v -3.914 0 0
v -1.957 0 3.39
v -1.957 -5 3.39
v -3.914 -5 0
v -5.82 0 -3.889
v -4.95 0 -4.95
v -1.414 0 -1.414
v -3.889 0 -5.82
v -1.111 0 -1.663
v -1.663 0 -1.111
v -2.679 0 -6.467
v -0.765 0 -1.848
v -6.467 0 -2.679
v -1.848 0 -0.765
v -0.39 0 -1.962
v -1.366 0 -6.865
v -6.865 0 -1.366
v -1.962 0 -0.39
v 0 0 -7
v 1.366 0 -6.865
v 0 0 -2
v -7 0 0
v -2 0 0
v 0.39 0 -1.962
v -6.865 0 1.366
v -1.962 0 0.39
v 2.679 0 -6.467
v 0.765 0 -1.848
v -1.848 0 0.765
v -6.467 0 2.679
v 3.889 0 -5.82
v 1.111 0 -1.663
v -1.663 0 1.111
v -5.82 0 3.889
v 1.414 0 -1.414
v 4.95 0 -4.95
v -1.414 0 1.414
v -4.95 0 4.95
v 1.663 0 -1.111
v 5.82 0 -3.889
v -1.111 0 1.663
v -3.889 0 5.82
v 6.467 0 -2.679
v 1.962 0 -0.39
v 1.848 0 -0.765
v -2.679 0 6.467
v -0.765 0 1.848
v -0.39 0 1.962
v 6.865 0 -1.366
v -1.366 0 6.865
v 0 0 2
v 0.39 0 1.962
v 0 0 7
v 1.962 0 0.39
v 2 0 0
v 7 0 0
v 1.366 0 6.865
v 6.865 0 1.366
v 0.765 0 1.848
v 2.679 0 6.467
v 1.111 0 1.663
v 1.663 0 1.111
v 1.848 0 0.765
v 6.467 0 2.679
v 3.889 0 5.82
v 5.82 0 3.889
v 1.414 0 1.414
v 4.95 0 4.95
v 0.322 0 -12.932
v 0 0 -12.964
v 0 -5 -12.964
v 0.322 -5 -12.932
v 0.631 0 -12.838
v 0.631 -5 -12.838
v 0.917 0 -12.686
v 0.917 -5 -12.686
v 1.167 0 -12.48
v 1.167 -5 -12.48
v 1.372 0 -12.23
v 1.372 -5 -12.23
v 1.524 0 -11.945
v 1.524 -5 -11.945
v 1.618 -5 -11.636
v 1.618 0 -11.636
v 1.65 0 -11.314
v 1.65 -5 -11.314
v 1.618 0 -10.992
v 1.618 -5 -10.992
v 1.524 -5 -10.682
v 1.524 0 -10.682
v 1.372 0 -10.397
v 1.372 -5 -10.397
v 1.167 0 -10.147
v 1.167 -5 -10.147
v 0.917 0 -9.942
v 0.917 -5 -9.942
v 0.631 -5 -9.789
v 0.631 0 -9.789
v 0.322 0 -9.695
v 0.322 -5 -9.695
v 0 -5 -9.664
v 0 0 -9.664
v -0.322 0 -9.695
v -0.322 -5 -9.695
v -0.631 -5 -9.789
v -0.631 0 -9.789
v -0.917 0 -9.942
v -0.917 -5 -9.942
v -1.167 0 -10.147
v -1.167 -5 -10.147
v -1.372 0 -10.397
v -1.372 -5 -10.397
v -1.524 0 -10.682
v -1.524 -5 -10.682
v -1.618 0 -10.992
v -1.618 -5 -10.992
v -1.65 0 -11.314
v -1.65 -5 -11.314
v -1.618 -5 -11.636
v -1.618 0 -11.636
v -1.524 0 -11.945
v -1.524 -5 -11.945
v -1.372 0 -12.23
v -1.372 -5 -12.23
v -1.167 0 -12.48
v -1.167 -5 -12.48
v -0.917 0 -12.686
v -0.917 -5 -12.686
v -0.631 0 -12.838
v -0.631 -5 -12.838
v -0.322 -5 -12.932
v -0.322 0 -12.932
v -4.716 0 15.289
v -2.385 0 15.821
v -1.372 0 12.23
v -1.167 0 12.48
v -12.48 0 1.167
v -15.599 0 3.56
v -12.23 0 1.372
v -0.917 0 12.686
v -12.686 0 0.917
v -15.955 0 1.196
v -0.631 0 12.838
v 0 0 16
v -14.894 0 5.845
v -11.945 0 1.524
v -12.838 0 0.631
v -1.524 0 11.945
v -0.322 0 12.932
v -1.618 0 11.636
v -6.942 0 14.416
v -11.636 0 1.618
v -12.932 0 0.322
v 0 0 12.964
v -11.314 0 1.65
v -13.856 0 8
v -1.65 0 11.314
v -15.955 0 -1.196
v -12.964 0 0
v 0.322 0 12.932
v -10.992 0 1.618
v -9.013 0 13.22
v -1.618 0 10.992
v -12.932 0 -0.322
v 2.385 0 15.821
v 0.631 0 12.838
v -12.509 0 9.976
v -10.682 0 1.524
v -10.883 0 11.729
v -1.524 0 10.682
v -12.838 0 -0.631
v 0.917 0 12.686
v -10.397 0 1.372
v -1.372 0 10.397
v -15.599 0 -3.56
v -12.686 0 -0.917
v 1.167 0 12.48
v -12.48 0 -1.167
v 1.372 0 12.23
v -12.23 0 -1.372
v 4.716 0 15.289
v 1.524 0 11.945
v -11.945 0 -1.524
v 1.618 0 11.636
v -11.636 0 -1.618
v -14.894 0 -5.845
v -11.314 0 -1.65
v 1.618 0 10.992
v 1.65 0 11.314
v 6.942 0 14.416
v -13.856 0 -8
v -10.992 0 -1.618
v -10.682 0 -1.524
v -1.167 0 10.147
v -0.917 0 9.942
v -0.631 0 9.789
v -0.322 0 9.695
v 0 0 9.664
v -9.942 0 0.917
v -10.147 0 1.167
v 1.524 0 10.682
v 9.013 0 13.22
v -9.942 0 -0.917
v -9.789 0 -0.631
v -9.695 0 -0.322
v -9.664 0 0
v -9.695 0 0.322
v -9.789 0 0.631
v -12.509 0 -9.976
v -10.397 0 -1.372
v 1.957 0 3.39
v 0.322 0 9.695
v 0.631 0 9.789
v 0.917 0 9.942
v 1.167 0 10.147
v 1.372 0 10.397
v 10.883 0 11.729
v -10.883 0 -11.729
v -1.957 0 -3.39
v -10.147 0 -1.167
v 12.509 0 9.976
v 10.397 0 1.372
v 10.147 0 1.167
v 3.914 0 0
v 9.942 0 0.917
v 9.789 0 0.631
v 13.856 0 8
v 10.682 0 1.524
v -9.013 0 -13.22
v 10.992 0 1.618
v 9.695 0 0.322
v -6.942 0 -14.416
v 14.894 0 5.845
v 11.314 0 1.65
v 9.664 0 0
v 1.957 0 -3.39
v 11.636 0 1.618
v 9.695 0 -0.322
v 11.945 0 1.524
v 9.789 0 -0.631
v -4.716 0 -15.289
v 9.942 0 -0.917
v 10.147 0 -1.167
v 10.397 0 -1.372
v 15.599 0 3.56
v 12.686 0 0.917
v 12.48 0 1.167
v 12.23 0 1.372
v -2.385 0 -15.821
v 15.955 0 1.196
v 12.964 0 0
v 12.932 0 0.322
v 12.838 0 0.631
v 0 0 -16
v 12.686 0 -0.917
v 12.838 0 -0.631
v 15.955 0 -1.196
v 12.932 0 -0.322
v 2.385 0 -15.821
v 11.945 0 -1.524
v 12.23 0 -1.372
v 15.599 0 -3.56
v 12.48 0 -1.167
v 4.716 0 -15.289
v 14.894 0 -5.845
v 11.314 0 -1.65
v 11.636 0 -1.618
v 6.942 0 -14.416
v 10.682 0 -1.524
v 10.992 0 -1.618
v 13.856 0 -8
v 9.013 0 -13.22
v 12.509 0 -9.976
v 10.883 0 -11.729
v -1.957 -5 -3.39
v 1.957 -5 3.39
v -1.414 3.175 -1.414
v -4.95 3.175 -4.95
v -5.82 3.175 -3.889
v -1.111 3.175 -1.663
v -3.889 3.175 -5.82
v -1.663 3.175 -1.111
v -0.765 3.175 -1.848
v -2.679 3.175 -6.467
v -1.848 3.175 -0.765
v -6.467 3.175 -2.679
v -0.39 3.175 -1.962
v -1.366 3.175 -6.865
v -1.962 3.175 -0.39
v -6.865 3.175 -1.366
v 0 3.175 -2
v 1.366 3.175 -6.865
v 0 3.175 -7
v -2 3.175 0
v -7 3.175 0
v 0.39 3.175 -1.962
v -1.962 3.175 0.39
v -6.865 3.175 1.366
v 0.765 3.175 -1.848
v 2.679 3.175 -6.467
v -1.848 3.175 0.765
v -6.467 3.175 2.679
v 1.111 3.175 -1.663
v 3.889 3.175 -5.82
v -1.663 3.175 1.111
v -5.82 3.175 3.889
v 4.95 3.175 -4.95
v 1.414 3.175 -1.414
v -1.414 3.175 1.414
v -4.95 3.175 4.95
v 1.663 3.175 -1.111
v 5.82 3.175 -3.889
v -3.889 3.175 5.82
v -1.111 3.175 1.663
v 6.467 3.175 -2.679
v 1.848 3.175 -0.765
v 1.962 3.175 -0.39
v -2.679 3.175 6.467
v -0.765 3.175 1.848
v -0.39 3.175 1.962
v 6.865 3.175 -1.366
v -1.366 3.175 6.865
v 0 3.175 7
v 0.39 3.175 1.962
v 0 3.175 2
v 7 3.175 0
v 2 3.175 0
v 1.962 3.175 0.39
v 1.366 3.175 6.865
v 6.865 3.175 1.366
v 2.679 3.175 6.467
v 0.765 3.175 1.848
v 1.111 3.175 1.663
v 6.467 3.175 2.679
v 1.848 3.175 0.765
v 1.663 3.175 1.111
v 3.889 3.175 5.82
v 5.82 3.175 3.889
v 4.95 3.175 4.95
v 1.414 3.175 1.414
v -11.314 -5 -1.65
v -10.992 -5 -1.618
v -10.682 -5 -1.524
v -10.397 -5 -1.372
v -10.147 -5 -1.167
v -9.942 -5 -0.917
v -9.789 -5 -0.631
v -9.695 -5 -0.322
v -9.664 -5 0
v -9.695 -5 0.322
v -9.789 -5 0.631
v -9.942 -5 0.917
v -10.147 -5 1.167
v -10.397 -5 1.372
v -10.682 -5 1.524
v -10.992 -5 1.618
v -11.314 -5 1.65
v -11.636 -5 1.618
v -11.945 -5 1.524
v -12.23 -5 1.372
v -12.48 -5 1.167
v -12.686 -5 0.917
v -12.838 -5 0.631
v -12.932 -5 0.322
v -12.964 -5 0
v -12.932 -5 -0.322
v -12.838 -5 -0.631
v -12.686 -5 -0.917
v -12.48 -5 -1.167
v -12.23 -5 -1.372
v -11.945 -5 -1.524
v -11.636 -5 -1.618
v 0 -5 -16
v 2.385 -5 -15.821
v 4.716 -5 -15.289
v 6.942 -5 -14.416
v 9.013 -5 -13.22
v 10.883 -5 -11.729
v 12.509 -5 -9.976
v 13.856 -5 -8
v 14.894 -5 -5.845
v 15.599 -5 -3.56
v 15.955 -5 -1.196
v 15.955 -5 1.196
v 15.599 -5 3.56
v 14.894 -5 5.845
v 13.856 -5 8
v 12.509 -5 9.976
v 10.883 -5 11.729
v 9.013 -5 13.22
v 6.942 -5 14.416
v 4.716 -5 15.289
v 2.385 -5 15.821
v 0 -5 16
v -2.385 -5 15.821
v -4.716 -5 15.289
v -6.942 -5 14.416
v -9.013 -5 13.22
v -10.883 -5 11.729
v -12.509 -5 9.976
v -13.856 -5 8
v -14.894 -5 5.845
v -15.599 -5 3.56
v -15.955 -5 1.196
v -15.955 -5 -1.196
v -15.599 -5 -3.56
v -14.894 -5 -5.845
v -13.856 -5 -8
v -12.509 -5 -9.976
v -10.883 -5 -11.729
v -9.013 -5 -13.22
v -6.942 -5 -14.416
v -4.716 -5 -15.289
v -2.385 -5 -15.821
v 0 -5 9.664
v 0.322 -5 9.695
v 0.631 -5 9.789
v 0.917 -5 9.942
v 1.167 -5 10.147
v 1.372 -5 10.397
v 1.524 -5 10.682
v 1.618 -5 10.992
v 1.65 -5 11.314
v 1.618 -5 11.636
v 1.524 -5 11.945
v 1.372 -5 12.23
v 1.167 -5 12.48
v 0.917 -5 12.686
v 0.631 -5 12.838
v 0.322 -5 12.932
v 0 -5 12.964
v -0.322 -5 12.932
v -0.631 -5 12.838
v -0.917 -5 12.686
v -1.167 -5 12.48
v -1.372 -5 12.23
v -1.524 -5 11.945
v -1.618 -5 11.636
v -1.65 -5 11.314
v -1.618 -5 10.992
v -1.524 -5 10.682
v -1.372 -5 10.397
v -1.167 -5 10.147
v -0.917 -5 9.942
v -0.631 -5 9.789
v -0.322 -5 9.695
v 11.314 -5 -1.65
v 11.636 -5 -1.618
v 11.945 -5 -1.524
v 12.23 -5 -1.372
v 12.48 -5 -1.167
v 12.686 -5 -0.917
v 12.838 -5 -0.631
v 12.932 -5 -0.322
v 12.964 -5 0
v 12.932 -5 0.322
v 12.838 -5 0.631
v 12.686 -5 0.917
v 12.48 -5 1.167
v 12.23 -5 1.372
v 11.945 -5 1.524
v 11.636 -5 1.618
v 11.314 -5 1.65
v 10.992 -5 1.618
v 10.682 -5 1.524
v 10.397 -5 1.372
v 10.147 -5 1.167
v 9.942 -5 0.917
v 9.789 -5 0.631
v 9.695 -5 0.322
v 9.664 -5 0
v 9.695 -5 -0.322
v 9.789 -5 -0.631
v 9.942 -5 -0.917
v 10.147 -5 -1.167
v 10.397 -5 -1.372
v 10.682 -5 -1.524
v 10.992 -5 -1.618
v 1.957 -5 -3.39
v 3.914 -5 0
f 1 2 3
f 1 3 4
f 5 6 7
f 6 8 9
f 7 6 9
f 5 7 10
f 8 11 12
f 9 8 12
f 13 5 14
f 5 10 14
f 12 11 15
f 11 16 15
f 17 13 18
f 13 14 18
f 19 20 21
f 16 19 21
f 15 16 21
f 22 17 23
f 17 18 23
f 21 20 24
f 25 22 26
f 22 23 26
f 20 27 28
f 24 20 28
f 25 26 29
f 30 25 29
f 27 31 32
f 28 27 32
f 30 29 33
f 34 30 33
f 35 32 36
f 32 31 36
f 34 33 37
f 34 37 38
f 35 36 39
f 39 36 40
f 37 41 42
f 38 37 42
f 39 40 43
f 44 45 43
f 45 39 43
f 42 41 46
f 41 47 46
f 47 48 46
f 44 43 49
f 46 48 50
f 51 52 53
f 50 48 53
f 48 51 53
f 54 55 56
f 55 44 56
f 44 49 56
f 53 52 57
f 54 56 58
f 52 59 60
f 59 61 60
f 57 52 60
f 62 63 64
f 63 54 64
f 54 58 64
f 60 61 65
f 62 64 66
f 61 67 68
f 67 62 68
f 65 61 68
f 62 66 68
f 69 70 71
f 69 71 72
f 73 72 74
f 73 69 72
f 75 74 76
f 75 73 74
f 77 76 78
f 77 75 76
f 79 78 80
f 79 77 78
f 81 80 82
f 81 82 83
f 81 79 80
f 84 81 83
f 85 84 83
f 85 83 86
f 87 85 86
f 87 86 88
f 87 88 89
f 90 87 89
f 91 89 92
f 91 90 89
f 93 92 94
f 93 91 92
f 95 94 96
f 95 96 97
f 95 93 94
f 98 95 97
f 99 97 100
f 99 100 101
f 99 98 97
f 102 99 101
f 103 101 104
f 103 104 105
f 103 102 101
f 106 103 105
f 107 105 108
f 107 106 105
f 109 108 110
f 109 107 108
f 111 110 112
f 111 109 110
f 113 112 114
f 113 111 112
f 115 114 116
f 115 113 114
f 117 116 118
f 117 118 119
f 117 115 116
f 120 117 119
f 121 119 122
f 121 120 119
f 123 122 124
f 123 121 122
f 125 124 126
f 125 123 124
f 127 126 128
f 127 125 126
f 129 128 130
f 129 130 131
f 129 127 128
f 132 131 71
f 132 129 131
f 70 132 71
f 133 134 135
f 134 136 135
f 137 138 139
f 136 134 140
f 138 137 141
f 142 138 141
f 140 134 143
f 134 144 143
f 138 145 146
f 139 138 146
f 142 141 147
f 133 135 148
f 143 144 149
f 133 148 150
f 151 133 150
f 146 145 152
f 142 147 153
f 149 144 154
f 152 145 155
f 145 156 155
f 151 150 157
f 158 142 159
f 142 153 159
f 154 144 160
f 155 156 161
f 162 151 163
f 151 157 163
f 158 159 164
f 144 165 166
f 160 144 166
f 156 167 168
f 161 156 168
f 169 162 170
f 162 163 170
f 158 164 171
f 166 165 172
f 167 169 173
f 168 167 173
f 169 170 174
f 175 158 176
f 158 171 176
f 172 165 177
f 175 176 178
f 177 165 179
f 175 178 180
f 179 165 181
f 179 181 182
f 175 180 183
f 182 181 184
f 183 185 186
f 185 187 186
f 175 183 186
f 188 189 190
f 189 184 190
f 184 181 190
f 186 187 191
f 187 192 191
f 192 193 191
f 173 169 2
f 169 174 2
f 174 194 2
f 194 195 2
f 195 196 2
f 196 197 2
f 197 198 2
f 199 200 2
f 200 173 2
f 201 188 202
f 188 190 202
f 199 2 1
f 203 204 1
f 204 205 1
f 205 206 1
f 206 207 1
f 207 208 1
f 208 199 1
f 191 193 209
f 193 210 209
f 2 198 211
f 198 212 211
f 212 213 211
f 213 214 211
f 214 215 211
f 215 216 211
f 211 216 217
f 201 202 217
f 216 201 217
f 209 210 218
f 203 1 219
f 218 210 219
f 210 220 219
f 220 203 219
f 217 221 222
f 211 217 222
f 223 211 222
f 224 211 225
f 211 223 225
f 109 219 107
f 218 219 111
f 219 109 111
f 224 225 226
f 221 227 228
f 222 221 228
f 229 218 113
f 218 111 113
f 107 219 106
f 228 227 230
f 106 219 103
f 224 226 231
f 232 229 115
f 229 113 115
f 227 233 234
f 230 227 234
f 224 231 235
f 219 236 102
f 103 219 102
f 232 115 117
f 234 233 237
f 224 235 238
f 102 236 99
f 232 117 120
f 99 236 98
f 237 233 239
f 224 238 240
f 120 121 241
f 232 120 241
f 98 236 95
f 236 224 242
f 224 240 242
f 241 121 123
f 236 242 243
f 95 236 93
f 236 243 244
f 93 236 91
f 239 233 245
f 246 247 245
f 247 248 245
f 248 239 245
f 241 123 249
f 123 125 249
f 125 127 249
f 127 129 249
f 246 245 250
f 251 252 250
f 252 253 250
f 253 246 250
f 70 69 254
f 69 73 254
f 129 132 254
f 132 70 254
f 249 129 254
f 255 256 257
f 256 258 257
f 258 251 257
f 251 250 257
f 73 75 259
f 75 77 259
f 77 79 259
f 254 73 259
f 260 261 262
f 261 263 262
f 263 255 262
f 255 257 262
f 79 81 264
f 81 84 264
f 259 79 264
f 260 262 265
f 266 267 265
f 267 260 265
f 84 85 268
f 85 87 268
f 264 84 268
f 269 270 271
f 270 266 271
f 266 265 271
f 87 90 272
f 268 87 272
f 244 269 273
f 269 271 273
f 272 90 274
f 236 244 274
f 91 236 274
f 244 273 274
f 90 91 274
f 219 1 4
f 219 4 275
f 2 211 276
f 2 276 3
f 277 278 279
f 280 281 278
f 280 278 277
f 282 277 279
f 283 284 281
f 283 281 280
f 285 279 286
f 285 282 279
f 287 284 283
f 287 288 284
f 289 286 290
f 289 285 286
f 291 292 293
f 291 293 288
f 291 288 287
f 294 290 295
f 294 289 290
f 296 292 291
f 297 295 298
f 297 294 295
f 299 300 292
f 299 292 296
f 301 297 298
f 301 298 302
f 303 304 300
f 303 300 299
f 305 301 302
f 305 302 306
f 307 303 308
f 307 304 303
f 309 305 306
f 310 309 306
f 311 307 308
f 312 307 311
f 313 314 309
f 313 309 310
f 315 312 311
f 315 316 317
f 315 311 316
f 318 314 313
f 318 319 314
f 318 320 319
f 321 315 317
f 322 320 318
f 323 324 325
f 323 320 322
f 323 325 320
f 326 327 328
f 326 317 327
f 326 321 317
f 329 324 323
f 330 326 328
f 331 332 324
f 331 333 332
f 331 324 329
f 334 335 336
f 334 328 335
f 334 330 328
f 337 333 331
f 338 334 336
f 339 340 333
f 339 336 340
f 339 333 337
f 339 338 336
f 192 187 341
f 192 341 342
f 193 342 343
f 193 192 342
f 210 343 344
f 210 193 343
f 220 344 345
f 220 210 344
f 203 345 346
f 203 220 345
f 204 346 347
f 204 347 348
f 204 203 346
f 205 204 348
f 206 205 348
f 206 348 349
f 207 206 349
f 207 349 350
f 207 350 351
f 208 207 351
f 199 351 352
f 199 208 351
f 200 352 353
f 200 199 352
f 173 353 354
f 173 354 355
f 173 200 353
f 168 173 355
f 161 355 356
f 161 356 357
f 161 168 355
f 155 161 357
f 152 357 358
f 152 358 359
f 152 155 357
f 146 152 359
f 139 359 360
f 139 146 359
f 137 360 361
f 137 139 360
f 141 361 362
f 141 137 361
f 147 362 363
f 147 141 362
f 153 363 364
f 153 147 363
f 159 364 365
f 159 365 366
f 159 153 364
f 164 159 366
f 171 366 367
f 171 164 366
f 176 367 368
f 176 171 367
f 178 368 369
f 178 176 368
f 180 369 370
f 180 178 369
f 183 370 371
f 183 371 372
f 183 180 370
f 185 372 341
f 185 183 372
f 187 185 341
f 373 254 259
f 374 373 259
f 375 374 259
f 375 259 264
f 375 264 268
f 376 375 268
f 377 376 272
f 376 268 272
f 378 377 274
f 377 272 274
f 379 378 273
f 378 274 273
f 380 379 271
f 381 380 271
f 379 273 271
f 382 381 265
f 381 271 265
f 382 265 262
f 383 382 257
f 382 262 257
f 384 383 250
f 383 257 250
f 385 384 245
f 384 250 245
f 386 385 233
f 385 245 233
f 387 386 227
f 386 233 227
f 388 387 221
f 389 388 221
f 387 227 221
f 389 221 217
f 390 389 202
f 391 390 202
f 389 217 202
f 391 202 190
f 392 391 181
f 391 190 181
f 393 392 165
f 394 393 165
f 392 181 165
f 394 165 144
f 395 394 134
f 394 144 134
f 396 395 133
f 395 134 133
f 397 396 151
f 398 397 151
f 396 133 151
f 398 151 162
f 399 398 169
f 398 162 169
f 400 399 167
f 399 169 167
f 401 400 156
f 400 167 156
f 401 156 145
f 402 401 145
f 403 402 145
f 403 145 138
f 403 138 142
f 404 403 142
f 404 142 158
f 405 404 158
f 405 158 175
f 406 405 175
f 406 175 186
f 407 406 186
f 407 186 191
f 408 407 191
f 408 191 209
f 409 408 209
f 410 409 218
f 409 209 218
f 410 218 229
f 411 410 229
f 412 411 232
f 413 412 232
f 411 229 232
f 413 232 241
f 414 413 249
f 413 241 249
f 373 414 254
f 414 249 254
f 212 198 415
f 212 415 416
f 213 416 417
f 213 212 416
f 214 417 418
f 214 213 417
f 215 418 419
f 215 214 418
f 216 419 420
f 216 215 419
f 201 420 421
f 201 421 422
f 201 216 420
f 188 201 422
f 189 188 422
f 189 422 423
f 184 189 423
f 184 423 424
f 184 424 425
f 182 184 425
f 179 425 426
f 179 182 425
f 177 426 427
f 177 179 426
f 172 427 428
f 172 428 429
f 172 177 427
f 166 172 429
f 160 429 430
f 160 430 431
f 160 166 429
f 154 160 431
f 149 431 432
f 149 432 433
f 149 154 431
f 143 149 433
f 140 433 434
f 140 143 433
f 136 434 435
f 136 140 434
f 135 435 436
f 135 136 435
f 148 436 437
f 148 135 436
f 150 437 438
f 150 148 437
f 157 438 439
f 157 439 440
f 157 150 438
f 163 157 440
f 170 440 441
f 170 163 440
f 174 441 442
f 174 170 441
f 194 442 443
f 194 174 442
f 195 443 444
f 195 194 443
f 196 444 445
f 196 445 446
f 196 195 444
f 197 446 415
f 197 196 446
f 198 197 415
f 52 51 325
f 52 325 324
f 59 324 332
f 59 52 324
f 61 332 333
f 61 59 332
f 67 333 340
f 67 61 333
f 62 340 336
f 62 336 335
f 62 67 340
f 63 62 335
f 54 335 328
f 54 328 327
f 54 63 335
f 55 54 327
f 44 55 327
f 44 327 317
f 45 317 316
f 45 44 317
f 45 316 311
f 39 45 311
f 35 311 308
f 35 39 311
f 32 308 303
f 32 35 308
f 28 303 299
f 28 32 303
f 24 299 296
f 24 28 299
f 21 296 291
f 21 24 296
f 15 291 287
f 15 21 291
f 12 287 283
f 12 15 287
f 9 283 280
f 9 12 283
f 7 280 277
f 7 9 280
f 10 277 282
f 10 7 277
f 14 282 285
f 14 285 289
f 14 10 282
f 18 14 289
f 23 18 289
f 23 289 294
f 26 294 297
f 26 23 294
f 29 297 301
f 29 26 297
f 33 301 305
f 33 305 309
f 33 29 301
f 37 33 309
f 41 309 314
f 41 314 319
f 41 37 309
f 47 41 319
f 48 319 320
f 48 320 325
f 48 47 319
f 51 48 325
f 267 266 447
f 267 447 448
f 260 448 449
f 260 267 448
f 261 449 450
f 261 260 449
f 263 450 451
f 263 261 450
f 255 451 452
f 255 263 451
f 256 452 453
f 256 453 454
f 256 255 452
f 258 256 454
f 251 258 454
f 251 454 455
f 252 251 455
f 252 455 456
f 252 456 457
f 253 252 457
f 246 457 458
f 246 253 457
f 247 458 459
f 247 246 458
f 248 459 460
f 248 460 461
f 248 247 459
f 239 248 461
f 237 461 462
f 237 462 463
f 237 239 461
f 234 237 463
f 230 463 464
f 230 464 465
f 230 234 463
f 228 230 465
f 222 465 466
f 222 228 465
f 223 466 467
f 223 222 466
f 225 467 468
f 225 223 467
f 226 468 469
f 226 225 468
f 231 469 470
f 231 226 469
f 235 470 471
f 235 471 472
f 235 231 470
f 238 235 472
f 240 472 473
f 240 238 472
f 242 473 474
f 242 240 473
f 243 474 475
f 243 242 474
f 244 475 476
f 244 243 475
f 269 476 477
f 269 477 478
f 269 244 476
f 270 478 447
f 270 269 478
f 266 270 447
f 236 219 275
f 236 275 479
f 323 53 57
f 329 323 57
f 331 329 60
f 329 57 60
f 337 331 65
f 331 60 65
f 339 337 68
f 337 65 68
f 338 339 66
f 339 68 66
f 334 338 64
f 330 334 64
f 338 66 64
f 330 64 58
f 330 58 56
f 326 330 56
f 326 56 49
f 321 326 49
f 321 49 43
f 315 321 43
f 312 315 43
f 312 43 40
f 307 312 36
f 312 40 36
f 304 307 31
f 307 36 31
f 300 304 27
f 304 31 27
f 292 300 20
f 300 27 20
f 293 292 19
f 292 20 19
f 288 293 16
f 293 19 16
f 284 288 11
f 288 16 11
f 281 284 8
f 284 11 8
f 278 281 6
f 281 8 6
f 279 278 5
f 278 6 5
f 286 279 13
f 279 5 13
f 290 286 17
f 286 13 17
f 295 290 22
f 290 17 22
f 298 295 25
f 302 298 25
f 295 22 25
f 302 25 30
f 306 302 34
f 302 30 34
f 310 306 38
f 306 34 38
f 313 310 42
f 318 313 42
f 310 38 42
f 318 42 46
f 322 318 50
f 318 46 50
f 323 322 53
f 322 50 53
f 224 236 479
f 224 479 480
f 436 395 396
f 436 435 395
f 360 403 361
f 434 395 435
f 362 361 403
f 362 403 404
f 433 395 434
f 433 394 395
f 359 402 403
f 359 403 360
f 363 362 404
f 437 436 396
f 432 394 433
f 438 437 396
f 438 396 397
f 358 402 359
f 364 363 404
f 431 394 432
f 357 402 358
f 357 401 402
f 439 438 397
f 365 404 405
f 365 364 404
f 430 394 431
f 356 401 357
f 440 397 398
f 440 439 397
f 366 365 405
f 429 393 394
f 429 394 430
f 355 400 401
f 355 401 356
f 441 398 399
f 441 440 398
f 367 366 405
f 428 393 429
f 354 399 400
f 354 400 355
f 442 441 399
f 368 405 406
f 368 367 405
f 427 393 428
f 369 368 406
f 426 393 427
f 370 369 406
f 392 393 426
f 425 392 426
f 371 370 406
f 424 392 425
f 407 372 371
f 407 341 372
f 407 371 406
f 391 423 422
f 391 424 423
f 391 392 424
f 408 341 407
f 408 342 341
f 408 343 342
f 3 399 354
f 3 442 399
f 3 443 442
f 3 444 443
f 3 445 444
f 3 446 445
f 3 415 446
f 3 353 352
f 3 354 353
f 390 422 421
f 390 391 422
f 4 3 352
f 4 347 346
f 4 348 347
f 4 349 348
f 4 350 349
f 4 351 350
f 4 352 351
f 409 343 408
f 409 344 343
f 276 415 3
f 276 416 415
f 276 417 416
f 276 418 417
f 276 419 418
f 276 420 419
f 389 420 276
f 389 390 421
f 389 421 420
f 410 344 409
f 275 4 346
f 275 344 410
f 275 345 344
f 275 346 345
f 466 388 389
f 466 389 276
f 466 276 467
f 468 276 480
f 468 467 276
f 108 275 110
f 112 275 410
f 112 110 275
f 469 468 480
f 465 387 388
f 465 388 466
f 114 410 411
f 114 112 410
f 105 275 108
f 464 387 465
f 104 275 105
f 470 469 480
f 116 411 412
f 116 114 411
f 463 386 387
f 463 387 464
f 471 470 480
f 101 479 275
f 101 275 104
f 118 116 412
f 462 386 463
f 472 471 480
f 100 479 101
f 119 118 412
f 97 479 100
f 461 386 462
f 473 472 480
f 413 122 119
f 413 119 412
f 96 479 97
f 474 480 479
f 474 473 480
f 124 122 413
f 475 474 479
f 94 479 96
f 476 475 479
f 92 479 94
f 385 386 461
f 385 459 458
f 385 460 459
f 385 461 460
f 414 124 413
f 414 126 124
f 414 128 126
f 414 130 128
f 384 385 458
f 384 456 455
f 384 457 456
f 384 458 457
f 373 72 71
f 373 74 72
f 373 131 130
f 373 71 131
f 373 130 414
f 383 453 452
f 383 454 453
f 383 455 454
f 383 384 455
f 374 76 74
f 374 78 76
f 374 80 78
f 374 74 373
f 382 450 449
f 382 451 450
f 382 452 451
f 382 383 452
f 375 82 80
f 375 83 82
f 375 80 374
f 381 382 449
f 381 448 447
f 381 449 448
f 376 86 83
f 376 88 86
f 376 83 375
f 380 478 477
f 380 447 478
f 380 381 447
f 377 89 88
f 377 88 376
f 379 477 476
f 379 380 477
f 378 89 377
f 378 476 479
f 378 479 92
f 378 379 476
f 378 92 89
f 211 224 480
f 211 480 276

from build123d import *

# Parameters (mm, degrees)
SKETCH1_R           = 7
SKETCH1_R_2         = 2
BOSS_EXTRUDE1_DEPTH = 3.175
SKETCH2_R           = 16
SKETCH2_R_2         = 1.65
BOSS_EXTRUDE2_DEPTH = 5


with BuildPart() as part:
    # Sketch1 → Boss-Extrude1 (new body)
    with BuildSketch(Plane(origin=(0, 0, 0), x_dir=(1, 0, 0), z_dir=(0, 1, 0))):
        with Locations(Location((0, 0, 0), (0, 0, 270))):
            Circle(SKETCH1_R)
        with Locations(Location((0, 0, 0), (0, 0, 270))):
            Circle(SKETCH1_R_2, mode=Mode.SUBTRACT)
    extrude(amount=BOSS_EXTRUDE1_DEPTH)


with BuildPart() as body_2:
    # Sketch2 → Boss-Extrude2 (new body)
    with BuildSketch(Plane(origin=(0, 0, 0), x_dir=(-1, 0, 0), z_dir=(0, -1, 0))):
        with Locations(Location((0, 0, 0), (0, 0, 90))):
            Circle(SKETCH2_R)
        with Locations(Location((11.313708499, 0, 0), (0, 0, 90))):
            Circle(SKETCH2_R_2, mode=Mode.SUBTRACT)
        with Locations(Location((0, 11.313708499, 0), (0, 0, 90))):
            Circle(SKETCH2_R_2, mode=Mode.SUBTRACT)
        with Locations(Location((-11.313708499, 0, 0), (0, 0, 90))):
            Circle(SKETCH2_R_2, mode=Mode.SUBTRACT)
        with Locations(Location((0, -11.313708499, 0), (0, 0, 90))):
            Circle(SKETCH2_R_2, mode=Mode.SUBTRACT)
        Polygon((3.914434825, 0), (1.957217413, 3.39), (-1.957217413, 3.39), (-3.914434825, 0), (-1.957217413, -3.39), (1.957217413, -3.39), align=None, mode=Mode.SUBTRACT)
    extrude(amount=BOSS_EXTRUDE2_DEPTH)


solid = Compound([part.part, body_2.part])
